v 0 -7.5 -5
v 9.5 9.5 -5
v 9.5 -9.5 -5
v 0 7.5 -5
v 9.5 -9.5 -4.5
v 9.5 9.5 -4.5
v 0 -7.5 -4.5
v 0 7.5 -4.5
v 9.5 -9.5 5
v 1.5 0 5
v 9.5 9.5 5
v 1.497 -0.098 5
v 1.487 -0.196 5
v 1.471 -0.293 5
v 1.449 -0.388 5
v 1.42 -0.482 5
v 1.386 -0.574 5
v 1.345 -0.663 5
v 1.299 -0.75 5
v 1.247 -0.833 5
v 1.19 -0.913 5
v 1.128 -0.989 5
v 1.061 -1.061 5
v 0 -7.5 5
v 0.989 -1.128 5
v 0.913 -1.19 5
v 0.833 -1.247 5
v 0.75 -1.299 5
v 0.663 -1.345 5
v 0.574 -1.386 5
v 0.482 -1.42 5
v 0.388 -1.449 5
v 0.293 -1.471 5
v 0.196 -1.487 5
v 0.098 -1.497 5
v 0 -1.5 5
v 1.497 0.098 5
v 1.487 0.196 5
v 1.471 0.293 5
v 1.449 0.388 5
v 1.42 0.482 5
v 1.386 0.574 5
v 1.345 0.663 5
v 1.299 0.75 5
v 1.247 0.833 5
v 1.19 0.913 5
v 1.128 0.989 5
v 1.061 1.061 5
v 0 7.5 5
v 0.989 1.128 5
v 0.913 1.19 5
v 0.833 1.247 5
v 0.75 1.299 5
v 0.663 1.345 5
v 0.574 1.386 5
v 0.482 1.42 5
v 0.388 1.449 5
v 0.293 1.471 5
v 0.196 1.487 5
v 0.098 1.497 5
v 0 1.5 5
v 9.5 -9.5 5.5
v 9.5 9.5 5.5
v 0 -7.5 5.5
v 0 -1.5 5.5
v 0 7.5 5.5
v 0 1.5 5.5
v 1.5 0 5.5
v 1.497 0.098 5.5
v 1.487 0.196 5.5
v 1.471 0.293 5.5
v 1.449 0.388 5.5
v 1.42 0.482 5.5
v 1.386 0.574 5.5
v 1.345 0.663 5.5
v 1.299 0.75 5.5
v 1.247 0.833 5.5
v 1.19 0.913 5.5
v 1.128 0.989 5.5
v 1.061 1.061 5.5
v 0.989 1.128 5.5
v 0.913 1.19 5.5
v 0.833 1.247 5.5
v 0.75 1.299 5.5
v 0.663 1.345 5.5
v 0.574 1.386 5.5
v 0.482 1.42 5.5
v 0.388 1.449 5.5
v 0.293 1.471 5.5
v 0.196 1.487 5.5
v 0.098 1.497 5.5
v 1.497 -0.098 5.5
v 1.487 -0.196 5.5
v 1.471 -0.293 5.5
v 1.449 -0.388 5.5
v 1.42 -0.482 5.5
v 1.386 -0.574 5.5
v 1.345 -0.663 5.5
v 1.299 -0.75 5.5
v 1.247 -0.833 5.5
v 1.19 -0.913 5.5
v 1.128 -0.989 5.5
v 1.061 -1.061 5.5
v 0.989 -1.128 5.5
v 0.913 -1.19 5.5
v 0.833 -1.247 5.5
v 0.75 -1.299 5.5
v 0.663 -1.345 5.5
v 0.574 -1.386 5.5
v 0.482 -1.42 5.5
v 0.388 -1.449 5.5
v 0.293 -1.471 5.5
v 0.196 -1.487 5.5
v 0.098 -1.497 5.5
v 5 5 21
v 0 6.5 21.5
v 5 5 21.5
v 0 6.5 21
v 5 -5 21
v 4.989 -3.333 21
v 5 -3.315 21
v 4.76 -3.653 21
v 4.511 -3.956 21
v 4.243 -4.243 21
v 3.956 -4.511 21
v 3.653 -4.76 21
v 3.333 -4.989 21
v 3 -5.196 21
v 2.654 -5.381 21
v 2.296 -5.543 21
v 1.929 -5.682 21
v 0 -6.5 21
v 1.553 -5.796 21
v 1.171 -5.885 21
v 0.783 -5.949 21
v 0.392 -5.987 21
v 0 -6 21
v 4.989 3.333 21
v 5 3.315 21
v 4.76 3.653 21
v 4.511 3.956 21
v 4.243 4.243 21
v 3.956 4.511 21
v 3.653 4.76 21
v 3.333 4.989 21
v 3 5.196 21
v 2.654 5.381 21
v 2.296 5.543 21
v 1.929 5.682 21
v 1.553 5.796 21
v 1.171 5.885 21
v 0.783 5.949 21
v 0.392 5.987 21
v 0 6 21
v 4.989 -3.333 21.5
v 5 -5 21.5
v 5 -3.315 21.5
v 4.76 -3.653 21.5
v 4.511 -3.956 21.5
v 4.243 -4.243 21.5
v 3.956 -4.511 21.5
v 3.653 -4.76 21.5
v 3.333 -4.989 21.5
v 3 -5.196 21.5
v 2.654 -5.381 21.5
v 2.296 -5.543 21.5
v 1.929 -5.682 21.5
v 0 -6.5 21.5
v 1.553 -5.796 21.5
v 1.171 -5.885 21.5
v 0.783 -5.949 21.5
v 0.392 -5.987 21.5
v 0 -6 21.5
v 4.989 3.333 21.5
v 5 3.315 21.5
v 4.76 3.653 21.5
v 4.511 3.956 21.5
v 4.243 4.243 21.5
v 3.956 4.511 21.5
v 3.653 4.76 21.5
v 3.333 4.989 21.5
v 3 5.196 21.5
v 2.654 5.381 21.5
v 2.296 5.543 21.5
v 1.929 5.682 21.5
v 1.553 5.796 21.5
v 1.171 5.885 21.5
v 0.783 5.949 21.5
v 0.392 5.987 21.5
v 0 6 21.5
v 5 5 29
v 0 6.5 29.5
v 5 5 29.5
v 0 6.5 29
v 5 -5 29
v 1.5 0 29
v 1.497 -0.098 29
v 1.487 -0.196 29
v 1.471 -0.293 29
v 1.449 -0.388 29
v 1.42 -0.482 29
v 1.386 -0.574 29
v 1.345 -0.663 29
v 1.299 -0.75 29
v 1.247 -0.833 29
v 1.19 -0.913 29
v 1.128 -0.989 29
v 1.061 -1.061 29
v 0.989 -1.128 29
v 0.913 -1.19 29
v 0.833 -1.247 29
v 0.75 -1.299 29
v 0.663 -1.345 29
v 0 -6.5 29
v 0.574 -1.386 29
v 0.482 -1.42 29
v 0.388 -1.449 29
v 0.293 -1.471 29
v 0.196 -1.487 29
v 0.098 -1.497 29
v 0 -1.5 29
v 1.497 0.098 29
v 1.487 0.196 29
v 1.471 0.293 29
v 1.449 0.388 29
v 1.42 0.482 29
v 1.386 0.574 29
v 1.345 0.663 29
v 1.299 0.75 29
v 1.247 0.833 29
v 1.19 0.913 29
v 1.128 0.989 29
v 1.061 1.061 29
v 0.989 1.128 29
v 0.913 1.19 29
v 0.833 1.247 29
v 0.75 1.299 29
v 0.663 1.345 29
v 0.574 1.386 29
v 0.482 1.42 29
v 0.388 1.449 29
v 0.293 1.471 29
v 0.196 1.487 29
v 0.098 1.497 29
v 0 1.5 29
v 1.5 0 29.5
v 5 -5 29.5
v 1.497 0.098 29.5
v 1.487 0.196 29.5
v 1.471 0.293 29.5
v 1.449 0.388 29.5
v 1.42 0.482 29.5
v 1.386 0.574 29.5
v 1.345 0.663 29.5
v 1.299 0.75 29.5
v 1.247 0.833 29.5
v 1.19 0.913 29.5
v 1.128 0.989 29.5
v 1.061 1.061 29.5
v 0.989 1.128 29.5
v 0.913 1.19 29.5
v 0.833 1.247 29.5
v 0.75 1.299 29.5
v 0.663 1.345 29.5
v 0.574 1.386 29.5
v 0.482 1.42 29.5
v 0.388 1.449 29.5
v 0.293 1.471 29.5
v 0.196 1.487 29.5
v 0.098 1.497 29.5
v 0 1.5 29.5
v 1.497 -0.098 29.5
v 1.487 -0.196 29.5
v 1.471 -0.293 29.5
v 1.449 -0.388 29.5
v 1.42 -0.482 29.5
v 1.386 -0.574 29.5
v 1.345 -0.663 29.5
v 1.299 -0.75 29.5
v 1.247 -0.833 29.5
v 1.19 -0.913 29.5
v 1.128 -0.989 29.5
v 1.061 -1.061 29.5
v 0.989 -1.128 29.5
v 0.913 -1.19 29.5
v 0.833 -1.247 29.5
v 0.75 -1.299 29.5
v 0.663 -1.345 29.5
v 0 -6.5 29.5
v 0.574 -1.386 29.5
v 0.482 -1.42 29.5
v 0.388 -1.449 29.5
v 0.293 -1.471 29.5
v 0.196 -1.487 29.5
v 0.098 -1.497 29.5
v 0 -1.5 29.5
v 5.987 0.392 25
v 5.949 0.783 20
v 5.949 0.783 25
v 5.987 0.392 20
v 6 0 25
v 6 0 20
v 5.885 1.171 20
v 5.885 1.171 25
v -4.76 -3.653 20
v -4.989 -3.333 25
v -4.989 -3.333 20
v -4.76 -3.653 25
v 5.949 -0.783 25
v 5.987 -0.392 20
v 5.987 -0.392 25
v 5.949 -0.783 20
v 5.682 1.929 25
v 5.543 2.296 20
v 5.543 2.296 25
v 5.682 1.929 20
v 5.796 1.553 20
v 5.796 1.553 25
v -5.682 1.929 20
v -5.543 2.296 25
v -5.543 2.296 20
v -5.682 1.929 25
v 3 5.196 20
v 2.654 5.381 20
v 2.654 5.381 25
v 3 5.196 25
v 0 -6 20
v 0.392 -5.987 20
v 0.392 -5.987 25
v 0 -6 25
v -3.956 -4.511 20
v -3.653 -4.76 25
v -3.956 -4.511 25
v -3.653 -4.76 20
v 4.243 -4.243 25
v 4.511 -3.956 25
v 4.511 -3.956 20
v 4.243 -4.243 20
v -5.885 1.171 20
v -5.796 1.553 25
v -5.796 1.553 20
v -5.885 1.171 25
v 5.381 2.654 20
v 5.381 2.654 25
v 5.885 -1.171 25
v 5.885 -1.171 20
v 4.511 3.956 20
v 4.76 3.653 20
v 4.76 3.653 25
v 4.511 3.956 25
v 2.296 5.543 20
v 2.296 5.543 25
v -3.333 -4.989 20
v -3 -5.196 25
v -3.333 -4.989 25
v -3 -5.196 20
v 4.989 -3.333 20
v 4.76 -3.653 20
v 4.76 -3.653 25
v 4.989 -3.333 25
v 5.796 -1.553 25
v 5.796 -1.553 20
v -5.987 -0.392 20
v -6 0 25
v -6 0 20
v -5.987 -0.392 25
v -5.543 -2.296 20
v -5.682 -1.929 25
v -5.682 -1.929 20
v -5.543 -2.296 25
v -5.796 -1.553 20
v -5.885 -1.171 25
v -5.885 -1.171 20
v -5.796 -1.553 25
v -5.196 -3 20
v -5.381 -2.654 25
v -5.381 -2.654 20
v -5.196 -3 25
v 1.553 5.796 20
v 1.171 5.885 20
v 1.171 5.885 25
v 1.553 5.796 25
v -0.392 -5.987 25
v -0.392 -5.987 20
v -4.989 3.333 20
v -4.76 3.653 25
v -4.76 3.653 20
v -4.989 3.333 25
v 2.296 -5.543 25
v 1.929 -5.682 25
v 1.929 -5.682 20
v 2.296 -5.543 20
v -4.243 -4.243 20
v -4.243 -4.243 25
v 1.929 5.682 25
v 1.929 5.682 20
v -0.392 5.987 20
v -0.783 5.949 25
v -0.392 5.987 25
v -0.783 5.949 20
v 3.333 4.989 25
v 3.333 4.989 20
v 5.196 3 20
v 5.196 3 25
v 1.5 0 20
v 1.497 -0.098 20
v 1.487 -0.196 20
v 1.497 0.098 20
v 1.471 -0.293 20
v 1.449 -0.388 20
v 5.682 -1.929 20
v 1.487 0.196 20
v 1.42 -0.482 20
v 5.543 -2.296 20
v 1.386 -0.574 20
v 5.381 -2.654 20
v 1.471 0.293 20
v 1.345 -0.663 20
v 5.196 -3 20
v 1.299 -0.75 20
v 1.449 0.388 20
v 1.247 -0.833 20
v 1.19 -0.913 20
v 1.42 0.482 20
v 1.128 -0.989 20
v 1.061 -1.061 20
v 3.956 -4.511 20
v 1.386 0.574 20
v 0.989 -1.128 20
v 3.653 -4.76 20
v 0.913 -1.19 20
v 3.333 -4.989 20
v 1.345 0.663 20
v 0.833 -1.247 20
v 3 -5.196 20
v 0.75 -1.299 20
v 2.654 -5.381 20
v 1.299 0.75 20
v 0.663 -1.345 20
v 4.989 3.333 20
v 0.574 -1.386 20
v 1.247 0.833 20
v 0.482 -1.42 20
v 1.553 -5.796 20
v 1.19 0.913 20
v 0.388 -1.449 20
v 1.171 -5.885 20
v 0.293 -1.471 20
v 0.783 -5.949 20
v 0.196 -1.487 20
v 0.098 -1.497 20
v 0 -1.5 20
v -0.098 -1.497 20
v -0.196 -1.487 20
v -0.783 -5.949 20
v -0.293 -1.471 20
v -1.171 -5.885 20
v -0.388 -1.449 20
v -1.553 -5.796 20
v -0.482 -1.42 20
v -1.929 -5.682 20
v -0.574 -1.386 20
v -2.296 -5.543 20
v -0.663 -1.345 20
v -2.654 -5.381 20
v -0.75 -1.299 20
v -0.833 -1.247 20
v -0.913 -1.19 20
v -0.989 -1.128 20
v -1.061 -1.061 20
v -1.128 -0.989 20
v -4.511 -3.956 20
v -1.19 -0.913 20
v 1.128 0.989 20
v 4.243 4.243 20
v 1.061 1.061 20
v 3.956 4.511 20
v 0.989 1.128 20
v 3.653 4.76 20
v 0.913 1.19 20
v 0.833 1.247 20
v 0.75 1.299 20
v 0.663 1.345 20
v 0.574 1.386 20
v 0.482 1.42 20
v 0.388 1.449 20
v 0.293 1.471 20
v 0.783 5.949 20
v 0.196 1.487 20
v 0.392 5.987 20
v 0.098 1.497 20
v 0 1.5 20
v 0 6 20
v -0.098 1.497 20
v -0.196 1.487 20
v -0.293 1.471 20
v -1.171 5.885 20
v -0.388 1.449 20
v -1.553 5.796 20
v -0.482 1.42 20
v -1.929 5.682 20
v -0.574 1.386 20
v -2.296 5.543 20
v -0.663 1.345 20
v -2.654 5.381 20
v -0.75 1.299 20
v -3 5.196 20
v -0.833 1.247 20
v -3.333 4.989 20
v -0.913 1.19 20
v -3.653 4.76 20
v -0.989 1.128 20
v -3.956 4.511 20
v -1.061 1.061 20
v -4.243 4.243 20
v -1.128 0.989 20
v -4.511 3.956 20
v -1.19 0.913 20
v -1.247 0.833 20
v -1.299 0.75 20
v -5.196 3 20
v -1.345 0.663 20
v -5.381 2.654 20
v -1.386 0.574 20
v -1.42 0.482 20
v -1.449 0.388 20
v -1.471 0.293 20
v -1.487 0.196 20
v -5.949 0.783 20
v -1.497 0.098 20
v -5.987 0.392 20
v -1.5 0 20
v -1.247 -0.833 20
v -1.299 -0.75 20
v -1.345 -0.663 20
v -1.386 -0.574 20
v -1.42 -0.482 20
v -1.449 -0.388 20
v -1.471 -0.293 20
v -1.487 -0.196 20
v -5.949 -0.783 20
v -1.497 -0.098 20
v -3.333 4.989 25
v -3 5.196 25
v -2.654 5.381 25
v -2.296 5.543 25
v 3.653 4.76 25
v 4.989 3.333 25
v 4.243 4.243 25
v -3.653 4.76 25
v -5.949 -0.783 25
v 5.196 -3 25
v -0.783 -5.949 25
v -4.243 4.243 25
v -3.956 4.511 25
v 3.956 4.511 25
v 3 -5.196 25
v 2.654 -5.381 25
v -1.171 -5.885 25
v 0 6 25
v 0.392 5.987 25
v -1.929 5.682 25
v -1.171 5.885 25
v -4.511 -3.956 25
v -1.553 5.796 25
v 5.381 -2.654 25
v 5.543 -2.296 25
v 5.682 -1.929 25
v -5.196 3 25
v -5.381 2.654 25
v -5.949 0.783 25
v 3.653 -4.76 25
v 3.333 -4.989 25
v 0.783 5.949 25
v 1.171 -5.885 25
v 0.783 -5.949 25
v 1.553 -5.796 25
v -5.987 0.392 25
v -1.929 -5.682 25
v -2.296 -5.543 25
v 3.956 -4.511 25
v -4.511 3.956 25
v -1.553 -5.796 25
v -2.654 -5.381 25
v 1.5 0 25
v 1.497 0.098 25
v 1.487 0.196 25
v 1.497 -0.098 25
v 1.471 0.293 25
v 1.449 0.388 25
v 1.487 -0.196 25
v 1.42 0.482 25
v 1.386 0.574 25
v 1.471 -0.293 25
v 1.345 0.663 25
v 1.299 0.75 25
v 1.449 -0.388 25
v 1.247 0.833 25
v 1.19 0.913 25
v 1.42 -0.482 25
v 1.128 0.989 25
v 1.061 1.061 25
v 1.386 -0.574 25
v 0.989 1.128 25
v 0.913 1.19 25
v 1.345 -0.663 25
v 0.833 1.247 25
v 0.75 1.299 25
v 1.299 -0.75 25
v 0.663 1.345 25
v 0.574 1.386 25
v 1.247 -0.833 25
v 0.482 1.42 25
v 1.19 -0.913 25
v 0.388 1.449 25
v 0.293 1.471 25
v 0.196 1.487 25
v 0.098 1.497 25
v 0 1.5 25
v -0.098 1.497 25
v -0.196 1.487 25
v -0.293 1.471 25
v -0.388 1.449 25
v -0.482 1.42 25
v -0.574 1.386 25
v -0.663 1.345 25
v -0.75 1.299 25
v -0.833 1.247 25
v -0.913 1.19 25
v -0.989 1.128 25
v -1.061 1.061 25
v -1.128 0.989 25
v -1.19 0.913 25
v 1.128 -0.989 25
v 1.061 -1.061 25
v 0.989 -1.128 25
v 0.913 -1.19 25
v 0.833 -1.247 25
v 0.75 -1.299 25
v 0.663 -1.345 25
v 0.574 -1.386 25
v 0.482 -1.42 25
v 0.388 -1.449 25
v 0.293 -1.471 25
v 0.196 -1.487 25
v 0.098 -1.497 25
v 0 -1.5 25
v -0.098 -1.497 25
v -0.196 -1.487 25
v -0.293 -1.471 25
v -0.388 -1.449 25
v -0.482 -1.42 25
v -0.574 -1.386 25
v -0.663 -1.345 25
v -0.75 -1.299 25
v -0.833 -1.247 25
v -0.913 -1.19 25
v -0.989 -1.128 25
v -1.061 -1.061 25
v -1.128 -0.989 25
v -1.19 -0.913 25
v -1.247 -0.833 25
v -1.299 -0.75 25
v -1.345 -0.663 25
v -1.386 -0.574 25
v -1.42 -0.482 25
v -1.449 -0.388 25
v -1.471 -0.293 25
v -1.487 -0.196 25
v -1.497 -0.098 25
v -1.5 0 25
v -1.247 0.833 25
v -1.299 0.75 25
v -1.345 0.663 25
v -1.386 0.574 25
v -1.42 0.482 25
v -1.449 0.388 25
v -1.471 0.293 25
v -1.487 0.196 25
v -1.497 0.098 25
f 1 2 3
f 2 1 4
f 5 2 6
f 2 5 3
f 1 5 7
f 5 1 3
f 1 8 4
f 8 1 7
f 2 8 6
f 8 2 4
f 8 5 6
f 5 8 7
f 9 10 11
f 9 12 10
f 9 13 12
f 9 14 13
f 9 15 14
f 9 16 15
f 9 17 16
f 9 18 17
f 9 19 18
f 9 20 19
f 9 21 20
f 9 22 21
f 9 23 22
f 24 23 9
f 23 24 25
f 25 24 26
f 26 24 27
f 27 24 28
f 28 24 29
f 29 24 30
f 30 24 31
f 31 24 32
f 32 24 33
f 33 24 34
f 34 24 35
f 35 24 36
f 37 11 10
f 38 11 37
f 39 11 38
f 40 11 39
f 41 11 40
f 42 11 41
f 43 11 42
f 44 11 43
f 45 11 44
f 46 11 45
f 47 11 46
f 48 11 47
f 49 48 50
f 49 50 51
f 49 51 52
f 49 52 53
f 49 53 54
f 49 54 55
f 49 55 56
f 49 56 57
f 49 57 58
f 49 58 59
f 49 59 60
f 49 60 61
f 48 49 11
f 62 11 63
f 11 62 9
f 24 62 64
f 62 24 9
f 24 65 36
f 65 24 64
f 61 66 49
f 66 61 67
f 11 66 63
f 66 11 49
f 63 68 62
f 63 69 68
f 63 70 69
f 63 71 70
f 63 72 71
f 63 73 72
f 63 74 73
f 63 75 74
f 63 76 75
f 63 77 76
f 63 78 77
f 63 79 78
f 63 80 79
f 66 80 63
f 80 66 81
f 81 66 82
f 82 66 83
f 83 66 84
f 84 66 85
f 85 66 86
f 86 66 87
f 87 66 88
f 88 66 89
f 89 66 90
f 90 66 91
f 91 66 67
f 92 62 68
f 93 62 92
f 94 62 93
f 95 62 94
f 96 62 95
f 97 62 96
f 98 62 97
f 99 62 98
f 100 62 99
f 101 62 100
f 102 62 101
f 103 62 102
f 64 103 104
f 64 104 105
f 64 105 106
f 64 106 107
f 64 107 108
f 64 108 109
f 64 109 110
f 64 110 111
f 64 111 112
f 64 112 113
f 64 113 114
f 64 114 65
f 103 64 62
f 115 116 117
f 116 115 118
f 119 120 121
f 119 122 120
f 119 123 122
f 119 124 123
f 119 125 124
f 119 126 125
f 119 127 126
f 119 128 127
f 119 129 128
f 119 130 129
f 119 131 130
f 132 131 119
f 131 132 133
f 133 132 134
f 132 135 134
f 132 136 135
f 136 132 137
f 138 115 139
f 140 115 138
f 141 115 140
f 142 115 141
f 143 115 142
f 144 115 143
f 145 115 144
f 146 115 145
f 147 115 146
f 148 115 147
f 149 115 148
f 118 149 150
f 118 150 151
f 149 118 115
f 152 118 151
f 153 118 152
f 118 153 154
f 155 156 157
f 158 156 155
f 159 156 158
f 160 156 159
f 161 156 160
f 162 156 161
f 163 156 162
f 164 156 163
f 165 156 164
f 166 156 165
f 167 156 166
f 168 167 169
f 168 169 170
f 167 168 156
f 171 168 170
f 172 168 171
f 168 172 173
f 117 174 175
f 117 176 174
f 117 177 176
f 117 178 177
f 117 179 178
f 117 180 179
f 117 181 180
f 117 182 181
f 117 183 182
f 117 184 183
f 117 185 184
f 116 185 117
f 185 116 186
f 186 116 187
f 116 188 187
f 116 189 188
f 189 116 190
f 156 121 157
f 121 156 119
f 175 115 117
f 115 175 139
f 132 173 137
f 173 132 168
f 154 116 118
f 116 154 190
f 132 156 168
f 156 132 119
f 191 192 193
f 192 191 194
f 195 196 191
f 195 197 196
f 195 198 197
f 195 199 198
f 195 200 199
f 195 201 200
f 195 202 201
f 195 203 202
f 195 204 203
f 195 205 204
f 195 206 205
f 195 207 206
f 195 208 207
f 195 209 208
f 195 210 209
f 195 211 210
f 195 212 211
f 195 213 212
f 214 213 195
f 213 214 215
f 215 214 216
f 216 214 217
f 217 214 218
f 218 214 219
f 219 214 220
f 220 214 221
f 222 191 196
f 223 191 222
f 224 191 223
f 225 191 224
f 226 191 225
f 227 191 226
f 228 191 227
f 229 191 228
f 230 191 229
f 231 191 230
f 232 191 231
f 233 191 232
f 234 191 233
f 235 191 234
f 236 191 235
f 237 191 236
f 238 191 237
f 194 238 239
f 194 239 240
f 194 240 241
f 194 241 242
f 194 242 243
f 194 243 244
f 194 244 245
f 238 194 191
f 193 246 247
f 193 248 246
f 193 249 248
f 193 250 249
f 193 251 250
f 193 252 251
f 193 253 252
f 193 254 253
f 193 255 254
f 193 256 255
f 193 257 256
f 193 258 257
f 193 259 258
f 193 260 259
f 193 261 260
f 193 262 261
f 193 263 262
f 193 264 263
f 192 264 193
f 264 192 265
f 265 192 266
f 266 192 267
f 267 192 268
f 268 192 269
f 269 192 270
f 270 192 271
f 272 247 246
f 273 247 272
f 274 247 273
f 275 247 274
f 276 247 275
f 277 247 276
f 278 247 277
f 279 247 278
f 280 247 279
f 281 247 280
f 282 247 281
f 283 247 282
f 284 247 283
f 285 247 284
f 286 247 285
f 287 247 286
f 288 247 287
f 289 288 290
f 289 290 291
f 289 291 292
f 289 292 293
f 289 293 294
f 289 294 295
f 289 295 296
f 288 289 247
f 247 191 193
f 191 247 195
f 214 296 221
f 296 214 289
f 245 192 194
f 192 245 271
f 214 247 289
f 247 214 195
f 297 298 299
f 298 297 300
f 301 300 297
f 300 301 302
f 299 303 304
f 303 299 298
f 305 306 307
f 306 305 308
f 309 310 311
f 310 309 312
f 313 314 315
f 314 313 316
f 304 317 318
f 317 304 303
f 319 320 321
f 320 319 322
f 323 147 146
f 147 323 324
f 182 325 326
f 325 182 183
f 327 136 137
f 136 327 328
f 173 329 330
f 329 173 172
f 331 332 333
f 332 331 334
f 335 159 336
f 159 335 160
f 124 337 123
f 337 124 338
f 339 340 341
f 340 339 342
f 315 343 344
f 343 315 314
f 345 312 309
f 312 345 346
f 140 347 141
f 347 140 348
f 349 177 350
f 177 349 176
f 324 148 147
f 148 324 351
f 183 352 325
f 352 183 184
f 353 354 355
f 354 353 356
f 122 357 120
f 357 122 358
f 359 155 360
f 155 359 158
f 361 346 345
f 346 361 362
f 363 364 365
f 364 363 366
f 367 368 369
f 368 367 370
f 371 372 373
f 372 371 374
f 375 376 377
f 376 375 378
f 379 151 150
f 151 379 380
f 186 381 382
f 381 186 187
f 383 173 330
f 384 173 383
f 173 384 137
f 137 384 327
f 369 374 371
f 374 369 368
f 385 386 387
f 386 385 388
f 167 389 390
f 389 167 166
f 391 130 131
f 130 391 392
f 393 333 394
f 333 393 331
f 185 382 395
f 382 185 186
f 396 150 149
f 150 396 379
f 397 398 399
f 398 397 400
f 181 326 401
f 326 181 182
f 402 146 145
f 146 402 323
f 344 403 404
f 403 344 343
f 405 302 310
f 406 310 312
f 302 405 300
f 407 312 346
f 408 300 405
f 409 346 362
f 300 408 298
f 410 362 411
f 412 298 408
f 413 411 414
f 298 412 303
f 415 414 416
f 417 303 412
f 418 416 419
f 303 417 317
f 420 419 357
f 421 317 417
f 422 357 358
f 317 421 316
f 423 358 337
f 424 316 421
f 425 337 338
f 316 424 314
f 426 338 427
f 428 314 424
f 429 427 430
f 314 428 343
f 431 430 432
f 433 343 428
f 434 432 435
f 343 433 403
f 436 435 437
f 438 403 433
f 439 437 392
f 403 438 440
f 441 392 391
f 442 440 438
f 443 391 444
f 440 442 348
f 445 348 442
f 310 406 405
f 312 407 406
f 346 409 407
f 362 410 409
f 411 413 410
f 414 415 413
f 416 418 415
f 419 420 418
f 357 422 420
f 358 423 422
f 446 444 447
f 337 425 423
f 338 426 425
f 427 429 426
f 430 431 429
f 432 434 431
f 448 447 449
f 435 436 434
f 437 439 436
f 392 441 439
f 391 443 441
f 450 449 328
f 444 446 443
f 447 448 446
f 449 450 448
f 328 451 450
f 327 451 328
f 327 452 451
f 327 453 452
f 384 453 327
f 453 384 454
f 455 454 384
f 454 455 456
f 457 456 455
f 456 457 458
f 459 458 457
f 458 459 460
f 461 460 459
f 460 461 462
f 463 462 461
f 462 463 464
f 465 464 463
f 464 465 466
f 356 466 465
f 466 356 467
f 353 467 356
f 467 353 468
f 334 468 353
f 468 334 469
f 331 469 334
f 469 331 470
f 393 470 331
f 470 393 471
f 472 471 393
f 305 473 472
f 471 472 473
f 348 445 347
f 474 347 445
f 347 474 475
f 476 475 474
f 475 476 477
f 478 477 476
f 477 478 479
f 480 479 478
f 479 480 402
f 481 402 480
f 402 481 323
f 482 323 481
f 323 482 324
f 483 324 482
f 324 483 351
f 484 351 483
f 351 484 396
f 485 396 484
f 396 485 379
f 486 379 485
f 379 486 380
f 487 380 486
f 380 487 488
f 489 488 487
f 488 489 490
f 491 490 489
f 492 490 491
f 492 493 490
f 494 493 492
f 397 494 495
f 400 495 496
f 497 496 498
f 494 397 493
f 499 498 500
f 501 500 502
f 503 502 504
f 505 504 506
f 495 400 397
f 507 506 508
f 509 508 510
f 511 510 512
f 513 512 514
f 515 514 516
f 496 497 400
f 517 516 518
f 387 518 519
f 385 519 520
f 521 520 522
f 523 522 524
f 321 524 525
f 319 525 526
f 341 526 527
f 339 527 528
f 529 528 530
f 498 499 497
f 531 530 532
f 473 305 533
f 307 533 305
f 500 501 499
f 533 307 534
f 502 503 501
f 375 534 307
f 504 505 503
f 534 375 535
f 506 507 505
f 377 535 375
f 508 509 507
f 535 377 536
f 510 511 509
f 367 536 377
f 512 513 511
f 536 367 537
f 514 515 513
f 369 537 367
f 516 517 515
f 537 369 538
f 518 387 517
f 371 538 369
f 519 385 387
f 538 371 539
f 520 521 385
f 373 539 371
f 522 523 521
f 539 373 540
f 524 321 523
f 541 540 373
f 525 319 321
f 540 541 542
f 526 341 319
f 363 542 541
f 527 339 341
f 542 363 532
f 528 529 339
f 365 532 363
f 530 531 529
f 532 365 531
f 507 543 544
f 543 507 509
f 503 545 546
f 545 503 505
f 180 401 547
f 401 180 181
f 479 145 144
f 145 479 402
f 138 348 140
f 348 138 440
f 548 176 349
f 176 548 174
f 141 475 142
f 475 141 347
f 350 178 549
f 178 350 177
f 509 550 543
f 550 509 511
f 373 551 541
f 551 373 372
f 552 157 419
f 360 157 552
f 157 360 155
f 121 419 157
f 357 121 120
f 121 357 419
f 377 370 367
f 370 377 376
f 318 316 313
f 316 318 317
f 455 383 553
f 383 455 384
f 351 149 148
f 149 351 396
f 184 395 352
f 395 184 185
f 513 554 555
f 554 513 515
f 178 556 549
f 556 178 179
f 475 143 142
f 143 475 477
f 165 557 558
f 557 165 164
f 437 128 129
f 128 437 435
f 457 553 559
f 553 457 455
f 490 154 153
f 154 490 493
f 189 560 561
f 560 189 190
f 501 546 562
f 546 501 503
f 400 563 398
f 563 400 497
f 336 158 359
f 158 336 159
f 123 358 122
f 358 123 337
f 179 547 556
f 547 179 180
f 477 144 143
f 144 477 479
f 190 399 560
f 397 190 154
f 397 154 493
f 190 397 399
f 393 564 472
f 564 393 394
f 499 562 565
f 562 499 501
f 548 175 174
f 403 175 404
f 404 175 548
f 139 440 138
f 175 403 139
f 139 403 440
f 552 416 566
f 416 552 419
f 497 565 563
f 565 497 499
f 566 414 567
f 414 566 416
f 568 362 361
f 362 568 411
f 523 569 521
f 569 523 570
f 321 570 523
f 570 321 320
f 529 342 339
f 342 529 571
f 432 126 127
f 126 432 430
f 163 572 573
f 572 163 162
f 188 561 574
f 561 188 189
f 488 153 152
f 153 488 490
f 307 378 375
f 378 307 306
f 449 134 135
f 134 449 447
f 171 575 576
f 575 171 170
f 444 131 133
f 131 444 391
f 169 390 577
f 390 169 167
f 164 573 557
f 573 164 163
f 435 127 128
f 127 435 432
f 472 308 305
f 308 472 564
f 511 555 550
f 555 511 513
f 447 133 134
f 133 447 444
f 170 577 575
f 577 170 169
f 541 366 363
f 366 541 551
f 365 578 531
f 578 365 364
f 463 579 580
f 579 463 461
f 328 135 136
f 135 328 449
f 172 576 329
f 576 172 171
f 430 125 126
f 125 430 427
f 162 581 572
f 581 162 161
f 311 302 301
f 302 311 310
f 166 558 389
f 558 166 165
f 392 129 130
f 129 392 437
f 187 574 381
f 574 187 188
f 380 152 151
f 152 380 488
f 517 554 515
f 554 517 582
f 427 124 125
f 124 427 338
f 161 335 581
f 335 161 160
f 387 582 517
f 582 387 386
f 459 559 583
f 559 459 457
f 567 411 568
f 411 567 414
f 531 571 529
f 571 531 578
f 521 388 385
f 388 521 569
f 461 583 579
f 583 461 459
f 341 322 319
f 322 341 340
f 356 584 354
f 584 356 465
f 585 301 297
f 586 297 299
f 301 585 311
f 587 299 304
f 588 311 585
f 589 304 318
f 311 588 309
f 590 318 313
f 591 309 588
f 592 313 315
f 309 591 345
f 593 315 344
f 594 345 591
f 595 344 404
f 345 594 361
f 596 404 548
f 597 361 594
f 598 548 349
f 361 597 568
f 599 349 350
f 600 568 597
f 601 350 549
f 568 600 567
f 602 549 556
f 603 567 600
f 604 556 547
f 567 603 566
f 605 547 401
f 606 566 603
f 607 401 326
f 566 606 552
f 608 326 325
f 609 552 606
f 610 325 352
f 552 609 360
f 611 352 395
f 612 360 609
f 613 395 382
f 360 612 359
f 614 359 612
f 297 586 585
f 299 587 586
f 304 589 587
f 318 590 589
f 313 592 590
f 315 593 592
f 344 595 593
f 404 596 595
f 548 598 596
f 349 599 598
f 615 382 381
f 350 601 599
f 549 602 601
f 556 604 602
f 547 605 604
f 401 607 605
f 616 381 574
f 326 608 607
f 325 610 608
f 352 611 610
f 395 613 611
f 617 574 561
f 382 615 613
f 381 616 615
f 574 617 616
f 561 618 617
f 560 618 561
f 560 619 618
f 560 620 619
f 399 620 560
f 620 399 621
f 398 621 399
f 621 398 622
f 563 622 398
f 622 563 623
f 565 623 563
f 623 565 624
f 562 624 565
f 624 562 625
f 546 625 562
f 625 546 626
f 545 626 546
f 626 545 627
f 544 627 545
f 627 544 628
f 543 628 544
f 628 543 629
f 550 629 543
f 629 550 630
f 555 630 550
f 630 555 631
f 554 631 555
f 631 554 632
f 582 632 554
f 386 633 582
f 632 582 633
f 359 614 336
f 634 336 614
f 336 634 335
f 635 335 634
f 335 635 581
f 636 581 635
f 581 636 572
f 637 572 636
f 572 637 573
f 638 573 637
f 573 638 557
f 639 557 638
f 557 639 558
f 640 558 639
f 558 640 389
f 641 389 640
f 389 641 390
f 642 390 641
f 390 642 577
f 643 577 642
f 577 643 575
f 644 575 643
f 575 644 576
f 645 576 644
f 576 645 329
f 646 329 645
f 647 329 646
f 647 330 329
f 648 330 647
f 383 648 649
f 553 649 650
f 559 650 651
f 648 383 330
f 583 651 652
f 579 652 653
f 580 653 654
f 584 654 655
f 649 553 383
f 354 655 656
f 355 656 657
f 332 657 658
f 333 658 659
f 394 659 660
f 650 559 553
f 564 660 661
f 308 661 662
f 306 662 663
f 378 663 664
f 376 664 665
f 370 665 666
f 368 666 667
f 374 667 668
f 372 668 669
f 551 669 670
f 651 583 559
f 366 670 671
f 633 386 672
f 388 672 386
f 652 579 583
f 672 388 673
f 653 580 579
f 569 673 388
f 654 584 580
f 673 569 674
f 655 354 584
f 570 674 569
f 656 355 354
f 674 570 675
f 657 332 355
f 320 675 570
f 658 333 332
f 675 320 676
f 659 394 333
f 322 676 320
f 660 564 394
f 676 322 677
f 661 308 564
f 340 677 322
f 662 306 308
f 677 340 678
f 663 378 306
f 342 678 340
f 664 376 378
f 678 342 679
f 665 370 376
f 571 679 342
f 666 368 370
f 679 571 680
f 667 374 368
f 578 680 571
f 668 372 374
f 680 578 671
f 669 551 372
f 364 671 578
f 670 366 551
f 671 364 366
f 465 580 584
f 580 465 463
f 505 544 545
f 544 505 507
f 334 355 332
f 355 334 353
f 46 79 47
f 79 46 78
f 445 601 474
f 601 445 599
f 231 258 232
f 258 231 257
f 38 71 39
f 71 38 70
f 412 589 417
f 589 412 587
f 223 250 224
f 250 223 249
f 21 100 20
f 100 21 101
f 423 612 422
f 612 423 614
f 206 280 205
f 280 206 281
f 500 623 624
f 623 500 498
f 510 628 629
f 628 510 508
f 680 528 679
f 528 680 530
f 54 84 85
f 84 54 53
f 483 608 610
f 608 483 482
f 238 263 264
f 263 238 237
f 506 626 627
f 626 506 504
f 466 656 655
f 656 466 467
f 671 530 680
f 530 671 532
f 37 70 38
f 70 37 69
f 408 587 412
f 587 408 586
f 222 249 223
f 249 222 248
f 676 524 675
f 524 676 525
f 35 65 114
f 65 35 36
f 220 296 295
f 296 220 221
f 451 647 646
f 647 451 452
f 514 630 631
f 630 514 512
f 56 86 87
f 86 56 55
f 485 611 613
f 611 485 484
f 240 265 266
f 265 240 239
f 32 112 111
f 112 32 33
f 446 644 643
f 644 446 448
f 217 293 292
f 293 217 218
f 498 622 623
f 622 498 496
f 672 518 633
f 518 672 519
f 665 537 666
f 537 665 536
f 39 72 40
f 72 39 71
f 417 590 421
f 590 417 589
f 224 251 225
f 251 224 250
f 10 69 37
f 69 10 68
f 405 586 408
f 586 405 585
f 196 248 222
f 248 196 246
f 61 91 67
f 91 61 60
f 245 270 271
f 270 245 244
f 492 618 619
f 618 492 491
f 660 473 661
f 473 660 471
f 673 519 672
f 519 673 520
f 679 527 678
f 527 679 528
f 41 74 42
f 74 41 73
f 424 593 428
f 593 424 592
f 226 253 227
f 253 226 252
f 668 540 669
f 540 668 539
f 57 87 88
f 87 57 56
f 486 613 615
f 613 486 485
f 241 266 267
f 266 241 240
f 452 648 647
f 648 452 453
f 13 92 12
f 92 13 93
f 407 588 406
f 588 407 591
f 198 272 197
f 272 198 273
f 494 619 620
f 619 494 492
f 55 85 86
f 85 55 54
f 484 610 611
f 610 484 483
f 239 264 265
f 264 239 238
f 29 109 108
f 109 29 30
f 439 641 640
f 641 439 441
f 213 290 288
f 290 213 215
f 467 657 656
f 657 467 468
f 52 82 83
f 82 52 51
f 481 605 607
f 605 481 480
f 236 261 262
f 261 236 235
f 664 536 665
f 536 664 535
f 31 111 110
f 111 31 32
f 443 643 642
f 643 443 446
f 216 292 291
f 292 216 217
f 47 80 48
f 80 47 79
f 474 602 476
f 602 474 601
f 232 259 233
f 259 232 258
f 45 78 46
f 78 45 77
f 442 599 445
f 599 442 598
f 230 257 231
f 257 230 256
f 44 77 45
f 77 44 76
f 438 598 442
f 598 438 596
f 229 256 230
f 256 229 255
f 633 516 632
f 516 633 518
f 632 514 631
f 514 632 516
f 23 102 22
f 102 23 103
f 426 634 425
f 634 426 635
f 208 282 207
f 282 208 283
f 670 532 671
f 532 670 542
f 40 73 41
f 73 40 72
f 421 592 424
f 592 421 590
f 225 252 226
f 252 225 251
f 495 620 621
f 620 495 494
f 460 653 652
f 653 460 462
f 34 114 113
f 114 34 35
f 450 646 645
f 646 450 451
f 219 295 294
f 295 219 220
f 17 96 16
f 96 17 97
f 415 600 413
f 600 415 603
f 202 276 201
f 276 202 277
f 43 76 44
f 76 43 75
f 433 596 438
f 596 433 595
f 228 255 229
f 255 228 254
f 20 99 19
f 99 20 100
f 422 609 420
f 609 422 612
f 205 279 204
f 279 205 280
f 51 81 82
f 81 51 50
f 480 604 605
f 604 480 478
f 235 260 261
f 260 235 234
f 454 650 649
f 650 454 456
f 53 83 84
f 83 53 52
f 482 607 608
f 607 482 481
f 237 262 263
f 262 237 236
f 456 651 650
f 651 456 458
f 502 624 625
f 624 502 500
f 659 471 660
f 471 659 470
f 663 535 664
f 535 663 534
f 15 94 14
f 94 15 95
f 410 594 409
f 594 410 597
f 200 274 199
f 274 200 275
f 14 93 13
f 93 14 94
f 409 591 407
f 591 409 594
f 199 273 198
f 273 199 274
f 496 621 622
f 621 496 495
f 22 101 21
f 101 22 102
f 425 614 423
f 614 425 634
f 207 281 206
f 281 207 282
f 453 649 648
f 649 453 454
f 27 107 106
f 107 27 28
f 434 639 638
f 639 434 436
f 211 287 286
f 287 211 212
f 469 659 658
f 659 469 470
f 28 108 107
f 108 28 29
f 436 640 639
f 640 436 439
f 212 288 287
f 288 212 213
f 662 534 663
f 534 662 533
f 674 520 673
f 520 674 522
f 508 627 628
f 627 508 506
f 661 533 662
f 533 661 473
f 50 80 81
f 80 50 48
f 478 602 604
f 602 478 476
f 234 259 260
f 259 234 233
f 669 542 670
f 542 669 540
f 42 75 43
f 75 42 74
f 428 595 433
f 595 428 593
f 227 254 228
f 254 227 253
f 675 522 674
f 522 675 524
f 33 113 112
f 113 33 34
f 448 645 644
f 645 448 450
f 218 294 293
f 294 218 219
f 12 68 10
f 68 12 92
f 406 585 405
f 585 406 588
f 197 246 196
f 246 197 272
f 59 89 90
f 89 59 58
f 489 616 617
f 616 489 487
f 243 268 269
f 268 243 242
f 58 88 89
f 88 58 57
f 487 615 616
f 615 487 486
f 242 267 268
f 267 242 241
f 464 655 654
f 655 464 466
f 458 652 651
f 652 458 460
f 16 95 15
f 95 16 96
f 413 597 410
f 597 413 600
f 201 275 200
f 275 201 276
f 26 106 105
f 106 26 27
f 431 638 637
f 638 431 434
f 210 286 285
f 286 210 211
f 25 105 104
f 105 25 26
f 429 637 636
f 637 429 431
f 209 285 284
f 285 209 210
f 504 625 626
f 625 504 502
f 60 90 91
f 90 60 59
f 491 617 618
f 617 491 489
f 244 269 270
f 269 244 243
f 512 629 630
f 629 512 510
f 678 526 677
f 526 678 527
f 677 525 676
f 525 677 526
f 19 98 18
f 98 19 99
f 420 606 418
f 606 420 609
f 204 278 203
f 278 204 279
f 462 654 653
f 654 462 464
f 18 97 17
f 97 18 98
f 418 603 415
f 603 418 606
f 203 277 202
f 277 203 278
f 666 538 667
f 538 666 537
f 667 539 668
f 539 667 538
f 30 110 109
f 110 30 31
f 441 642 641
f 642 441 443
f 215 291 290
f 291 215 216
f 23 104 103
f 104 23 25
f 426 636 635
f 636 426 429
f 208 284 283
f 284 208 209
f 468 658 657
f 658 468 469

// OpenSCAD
// Hose-barb reducer: 8 mm tubing (bottom) -> 5 mm tubing (top)
// Print orientation: standing upright along +Z, centred on origin in X/Y

$fn = 96;

// ---- Dimensions (mm) ----
tube_d1      = 8;    // lower tubing inner diameter
tube_d2      = 5;    // upper tubing inner diameter
bore_d       = 3;    // through-bore diameter
barb_h1      = 10;   // lower barbs height
barb_od1_bot = 7.5;  // lower barbs outer diameter at bottom
barb_od1_top = 9.5;  // lower barbs outer diameter at top
collar_d     = 12;   // collar diameter (z = 20..25)
barb_h2      = 8;    // upper barbs height
barb_od2_bot = 6.5;  // upper barbs outer diameter at bottom
barb_od2_top = 5.0;  // upper barbs outer diameter at top
eps          = 0.5;  // overshoot for clean cuts

total_len = 41;      // overall length (z = 0..41)

// ---- Model ----
difference() {
    union() {
        // Lower section: two stacked barbs for 8 mm tubing
        for (s = [-1, 1])
            translate([0, 0, s * (barb_h1 / 2)])
                linear_extrude(height = eps)
                    polygon(points = [
                        [0, barb_od1_bot],
                        [barb_od1_top, barb_od1_top],
                        [barb_od1_top, -barb_od1_top],
                        [0, -barb_od1_bot]
                    ]);

        // Collar
        translate([0, 0, 20])
            cylinder(d = collar_d, h = 5);

        // Upper section: two stacked barbs for 5 mm tubing
        for (s = [-1, 1])
            translate([0, 0, s * (barb_h2 / 2) + 25])
                linear_extrude(height = eps)
                    polygon(points = [
                        [0, barb_od2_bot],
                        [barb_od2_top, barb_od2_top],
                        [barb_od2_top, -barb_od2_top],
                        [0, -barb_od2_bot]
                    ]);
    }

    // Through-bore
    translate([0, 0, -eps])
        cylinder(d = bore_d, h = total_len + 2 * eps);
}
